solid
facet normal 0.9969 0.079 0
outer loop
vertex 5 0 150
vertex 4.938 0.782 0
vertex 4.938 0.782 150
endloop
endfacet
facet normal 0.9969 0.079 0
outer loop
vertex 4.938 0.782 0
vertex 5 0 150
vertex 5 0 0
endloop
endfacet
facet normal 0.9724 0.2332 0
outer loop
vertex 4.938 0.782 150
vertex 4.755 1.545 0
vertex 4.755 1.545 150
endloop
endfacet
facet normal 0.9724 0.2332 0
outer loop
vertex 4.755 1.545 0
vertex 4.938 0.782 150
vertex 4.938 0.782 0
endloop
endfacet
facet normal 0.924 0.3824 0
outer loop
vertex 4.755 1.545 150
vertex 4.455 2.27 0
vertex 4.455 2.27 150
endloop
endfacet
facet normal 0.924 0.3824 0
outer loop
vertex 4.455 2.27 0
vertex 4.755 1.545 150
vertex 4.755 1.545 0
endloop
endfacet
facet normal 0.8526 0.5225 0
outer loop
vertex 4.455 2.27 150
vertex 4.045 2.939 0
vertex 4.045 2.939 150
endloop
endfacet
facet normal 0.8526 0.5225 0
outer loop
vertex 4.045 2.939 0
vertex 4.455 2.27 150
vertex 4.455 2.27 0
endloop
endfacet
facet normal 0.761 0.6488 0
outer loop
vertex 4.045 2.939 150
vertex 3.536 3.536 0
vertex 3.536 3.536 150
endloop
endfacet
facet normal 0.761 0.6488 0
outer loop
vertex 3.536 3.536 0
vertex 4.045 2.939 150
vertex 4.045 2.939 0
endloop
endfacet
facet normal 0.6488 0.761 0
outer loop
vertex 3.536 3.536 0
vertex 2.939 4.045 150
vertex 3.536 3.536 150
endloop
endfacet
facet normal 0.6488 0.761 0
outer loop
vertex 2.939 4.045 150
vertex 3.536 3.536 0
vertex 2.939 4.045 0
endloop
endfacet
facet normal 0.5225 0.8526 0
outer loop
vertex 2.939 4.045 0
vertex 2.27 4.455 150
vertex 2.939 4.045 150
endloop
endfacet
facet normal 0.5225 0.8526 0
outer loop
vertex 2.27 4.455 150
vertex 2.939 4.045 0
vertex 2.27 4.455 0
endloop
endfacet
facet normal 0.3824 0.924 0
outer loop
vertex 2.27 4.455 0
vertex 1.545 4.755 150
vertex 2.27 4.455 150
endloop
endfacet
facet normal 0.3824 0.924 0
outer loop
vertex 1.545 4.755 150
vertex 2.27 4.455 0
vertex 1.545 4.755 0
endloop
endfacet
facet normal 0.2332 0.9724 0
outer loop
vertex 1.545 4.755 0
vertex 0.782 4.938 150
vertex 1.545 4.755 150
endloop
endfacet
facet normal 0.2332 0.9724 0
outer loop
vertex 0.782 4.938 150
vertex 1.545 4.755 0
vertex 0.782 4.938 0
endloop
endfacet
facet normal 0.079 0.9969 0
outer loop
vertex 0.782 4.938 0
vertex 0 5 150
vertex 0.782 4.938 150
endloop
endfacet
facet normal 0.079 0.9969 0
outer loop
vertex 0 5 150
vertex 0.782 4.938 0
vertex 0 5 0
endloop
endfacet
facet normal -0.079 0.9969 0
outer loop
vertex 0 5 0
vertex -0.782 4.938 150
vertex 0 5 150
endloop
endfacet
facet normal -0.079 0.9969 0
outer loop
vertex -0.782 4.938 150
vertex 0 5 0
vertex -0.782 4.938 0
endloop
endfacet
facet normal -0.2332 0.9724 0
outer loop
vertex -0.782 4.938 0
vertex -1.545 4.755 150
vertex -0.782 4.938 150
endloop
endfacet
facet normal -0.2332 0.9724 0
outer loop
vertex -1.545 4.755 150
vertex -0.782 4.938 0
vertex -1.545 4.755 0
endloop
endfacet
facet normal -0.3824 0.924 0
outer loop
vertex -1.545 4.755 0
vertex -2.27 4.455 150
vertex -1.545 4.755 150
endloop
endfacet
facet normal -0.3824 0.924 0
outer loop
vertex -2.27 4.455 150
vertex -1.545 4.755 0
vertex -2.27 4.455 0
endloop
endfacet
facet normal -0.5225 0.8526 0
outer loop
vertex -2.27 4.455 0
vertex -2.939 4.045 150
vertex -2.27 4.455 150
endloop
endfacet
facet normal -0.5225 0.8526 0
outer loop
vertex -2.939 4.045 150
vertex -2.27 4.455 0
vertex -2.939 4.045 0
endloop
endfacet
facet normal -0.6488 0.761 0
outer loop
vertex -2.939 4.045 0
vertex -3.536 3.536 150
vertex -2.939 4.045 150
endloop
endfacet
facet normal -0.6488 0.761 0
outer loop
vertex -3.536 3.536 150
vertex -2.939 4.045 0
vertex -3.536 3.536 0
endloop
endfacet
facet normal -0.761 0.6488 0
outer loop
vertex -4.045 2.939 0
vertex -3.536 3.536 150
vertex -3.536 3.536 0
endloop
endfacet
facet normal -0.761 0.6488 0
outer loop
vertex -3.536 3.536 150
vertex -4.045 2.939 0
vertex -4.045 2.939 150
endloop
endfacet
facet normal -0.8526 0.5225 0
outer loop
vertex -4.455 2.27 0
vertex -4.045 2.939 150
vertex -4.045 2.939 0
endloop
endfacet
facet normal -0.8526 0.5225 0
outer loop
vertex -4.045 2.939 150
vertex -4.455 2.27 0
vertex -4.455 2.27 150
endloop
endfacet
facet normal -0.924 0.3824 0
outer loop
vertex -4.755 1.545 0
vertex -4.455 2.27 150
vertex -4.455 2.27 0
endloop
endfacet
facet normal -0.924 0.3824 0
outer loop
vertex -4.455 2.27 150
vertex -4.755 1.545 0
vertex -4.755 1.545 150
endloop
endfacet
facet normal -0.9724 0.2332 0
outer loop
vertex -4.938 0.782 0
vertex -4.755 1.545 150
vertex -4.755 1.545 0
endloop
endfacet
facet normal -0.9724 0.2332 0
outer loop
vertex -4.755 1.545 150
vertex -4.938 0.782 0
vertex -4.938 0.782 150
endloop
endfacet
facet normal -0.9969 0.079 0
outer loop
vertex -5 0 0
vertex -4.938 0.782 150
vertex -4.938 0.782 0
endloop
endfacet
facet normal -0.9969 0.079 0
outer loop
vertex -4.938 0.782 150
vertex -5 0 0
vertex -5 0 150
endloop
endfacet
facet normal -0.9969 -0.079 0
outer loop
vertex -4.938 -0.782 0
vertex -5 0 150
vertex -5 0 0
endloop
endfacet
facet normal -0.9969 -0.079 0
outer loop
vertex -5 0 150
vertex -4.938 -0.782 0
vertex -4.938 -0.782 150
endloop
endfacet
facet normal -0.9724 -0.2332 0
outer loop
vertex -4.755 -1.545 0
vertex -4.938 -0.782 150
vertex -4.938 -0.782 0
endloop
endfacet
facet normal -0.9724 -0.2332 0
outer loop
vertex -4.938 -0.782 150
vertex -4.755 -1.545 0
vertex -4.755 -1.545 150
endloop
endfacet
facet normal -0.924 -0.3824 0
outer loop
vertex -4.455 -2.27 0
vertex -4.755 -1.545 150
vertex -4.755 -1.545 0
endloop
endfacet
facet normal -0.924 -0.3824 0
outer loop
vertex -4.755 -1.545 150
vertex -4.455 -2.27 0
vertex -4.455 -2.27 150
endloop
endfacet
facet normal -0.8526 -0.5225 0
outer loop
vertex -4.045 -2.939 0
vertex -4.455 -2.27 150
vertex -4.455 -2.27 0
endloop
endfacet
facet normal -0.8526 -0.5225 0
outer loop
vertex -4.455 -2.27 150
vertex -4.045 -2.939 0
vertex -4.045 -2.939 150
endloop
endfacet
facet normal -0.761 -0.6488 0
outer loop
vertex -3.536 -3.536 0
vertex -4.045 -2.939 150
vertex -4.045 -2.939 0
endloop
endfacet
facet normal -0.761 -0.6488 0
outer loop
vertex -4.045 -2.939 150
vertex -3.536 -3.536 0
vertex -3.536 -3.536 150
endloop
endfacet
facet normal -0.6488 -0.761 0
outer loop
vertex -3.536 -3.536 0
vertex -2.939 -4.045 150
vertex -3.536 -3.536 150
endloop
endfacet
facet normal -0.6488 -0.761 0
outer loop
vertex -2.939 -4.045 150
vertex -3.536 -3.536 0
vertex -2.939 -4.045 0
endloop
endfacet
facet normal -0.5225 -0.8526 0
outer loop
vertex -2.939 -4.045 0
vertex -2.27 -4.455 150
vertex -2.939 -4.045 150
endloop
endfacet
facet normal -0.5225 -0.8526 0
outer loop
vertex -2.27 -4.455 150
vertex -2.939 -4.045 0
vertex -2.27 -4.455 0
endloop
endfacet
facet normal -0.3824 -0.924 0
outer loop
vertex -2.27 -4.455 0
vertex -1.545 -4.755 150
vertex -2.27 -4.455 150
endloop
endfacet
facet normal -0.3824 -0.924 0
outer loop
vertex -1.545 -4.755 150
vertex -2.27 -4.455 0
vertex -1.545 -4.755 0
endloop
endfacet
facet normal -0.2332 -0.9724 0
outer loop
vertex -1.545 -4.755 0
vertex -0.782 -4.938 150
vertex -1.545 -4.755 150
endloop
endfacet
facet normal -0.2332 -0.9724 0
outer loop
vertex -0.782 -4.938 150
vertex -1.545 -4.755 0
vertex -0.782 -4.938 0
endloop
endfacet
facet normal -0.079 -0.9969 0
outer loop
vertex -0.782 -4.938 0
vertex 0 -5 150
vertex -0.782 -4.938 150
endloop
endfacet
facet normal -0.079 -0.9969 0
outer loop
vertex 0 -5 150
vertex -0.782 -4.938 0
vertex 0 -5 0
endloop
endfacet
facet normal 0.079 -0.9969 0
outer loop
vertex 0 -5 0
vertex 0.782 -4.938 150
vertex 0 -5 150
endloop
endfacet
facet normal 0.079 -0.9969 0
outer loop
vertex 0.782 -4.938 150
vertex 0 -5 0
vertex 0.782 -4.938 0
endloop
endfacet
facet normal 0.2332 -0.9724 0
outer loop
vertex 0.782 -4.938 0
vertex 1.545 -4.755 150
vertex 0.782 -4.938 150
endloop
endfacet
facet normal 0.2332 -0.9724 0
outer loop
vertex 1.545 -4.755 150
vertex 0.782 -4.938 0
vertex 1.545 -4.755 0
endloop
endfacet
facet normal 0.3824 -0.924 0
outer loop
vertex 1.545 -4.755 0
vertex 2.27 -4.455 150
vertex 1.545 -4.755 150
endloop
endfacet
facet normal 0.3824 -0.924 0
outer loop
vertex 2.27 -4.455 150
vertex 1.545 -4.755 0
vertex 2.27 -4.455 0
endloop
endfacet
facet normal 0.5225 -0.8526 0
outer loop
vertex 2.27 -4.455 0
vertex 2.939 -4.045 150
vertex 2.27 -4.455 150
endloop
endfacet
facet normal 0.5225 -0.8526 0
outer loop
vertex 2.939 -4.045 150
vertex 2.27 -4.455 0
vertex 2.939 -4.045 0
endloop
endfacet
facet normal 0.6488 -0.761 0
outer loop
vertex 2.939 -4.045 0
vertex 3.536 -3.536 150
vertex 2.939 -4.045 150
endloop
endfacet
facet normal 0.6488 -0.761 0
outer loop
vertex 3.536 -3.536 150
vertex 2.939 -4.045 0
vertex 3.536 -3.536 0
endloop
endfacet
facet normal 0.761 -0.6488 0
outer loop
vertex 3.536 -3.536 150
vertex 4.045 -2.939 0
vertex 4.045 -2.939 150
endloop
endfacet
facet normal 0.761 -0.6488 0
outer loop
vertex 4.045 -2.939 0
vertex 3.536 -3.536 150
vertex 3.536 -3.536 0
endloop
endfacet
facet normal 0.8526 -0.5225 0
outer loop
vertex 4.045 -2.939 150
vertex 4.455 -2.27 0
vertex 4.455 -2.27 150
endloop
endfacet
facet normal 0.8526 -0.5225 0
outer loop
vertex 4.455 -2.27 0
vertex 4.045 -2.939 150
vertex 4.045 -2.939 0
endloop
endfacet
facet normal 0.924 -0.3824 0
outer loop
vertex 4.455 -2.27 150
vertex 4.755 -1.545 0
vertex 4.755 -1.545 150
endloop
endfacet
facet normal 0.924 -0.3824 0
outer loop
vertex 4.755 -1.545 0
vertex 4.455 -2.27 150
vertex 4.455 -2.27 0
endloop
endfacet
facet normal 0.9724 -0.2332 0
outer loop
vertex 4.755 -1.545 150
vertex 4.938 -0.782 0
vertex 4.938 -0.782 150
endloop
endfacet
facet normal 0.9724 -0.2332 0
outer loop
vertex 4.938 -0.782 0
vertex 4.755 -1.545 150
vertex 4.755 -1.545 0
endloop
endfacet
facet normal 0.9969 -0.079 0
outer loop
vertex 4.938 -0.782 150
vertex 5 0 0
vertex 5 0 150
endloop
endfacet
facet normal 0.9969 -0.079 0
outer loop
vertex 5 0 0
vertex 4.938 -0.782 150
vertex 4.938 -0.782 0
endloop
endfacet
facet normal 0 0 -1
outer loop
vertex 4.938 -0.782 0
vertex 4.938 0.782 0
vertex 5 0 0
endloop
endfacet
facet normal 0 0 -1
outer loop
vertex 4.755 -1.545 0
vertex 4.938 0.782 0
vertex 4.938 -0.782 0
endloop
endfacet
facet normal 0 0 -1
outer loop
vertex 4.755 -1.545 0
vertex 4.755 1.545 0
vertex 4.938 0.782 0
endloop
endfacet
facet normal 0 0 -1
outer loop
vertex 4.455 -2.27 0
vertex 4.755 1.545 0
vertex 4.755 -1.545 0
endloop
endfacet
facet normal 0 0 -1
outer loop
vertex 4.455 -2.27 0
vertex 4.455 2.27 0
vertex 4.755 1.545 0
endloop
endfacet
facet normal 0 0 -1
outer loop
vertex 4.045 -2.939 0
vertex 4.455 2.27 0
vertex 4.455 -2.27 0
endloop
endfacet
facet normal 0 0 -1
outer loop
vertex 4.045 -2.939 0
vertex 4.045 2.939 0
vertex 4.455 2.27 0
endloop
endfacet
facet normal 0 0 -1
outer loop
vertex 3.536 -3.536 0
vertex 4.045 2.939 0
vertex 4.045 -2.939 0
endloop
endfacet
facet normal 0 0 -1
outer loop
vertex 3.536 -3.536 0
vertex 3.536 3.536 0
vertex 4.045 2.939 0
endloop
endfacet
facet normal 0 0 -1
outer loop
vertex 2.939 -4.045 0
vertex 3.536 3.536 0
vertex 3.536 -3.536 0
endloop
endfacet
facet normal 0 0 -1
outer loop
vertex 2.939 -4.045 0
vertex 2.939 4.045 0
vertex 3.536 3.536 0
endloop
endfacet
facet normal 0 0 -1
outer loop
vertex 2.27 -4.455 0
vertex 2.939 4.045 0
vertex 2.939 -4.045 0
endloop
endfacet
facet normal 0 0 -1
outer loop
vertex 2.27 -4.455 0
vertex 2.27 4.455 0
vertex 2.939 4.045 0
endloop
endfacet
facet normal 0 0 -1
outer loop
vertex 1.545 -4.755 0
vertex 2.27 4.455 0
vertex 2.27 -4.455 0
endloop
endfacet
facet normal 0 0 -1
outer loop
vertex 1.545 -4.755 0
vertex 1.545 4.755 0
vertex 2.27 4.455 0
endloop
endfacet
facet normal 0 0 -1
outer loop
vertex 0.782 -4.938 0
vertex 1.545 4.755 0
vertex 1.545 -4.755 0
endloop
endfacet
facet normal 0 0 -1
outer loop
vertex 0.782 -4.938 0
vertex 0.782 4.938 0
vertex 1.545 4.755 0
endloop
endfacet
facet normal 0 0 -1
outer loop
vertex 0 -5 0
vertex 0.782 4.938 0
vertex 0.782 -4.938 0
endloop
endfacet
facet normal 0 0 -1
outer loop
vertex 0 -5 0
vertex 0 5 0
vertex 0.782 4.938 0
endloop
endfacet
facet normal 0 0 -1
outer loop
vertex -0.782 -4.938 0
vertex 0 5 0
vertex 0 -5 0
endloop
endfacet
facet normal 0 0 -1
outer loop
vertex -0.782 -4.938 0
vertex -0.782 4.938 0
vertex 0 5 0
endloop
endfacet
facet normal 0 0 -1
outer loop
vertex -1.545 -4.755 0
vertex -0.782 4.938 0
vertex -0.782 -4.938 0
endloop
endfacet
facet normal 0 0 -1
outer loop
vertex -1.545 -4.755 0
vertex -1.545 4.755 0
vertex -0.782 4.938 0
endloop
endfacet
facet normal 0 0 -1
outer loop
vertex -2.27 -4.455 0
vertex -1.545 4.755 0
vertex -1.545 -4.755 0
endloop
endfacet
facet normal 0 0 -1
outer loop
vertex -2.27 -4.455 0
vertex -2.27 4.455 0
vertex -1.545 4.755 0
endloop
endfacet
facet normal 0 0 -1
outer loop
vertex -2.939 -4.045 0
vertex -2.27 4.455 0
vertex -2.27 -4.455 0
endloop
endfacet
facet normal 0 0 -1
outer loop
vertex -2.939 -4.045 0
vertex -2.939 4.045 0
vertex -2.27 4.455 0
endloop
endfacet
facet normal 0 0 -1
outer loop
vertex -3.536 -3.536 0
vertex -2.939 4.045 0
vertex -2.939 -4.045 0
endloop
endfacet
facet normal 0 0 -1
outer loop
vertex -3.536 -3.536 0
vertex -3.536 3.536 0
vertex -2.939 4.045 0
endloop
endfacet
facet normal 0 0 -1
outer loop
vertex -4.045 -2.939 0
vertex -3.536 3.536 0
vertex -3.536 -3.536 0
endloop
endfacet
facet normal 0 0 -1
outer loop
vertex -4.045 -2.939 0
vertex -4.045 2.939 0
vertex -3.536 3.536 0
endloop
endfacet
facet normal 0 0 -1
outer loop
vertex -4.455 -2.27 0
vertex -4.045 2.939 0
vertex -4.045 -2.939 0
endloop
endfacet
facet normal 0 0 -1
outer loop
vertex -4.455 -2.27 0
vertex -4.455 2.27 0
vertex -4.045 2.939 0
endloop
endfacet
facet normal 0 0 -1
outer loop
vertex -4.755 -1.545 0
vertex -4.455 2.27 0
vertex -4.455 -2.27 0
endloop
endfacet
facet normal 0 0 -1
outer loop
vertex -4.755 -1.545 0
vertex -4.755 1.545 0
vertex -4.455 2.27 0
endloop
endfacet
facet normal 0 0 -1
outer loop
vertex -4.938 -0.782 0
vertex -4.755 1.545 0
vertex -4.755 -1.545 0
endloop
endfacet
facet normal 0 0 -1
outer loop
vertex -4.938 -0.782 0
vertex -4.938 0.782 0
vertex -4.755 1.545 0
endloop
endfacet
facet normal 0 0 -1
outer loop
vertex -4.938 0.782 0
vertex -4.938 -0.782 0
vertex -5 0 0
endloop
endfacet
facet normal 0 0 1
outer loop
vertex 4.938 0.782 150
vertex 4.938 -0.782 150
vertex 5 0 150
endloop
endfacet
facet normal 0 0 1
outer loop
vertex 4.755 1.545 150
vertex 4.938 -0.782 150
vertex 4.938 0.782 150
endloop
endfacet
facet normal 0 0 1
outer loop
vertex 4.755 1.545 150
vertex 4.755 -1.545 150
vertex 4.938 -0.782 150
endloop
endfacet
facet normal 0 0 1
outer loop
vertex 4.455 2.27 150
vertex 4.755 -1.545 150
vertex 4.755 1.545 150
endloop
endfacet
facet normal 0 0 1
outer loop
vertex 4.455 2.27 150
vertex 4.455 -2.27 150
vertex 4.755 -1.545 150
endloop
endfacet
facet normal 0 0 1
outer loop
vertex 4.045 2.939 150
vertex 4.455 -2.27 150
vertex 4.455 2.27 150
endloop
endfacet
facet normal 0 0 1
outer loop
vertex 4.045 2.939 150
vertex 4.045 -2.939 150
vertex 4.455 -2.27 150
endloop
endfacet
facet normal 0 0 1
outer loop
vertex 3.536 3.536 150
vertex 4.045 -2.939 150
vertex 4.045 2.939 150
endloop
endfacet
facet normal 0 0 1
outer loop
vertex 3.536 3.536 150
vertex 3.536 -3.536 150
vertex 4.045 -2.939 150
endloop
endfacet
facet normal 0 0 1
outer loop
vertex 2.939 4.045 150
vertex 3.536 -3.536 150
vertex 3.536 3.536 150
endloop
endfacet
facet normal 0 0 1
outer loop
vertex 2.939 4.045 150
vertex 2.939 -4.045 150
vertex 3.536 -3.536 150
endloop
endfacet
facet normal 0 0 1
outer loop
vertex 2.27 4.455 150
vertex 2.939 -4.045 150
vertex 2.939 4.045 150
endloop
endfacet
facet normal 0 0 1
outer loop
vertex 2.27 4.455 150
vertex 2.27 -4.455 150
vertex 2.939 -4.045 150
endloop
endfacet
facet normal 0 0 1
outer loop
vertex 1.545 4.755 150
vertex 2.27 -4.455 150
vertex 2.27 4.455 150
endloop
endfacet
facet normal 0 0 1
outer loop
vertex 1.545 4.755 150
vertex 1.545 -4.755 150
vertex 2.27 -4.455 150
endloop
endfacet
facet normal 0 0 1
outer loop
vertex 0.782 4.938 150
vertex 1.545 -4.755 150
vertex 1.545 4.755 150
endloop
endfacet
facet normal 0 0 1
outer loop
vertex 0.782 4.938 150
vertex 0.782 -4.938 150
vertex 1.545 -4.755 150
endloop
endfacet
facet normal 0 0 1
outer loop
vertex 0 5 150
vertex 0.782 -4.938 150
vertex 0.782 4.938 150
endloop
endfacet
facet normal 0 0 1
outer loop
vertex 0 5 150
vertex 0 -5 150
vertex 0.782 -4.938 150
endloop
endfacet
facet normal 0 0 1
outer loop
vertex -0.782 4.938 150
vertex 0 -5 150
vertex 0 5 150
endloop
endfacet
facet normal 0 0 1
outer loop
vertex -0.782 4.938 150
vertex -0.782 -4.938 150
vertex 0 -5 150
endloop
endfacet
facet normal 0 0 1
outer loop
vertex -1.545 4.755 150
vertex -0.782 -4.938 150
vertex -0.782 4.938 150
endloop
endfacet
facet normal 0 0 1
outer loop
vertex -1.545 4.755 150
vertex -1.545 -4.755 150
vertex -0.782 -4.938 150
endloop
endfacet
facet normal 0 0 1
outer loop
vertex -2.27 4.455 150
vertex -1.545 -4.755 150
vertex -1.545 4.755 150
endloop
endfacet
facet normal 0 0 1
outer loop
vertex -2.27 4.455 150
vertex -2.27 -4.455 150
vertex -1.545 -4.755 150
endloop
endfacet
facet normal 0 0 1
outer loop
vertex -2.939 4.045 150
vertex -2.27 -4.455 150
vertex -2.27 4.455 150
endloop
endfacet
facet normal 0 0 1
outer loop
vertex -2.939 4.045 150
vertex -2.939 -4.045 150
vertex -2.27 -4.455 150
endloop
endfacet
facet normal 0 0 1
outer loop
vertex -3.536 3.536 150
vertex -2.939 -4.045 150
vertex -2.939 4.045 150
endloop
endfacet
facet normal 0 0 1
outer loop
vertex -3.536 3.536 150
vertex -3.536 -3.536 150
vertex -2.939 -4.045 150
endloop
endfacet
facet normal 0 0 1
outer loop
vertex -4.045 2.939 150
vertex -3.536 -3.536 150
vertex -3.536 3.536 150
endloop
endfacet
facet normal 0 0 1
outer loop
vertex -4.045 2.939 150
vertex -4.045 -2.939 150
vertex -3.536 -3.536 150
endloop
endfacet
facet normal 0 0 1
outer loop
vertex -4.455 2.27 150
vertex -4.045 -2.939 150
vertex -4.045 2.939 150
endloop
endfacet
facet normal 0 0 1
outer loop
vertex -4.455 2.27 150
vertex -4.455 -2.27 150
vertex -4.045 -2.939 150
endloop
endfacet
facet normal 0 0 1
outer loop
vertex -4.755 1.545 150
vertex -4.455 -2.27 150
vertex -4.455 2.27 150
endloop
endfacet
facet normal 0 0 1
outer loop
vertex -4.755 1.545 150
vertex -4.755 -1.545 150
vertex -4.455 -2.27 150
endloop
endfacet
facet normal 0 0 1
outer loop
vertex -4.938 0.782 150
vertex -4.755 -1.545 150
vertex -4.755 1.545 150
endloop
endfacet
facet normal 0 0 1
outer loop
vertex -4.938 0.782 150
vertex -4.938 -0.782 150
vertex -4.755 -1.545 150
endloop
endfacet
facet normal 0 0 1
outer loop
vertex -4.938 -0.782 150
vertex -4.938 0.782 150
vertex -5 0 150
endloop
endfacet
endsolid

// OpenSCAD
$fn = 40;

thickness = 5;
height = 150;
x_rotation = 0;
y_rotation = 0;
z_rotation = 0;

x_adjustment = 0;
y_adjustment = 0;
z_adjustment = thickness; 
z_adjustment = 0; 

translate([x_adjustment, y_adjustment, z_adjustment]){
    rotate([x_rotation, y_rotation, z_rotation]){
        cylinder(height, thickness, thickness);
    }
}
